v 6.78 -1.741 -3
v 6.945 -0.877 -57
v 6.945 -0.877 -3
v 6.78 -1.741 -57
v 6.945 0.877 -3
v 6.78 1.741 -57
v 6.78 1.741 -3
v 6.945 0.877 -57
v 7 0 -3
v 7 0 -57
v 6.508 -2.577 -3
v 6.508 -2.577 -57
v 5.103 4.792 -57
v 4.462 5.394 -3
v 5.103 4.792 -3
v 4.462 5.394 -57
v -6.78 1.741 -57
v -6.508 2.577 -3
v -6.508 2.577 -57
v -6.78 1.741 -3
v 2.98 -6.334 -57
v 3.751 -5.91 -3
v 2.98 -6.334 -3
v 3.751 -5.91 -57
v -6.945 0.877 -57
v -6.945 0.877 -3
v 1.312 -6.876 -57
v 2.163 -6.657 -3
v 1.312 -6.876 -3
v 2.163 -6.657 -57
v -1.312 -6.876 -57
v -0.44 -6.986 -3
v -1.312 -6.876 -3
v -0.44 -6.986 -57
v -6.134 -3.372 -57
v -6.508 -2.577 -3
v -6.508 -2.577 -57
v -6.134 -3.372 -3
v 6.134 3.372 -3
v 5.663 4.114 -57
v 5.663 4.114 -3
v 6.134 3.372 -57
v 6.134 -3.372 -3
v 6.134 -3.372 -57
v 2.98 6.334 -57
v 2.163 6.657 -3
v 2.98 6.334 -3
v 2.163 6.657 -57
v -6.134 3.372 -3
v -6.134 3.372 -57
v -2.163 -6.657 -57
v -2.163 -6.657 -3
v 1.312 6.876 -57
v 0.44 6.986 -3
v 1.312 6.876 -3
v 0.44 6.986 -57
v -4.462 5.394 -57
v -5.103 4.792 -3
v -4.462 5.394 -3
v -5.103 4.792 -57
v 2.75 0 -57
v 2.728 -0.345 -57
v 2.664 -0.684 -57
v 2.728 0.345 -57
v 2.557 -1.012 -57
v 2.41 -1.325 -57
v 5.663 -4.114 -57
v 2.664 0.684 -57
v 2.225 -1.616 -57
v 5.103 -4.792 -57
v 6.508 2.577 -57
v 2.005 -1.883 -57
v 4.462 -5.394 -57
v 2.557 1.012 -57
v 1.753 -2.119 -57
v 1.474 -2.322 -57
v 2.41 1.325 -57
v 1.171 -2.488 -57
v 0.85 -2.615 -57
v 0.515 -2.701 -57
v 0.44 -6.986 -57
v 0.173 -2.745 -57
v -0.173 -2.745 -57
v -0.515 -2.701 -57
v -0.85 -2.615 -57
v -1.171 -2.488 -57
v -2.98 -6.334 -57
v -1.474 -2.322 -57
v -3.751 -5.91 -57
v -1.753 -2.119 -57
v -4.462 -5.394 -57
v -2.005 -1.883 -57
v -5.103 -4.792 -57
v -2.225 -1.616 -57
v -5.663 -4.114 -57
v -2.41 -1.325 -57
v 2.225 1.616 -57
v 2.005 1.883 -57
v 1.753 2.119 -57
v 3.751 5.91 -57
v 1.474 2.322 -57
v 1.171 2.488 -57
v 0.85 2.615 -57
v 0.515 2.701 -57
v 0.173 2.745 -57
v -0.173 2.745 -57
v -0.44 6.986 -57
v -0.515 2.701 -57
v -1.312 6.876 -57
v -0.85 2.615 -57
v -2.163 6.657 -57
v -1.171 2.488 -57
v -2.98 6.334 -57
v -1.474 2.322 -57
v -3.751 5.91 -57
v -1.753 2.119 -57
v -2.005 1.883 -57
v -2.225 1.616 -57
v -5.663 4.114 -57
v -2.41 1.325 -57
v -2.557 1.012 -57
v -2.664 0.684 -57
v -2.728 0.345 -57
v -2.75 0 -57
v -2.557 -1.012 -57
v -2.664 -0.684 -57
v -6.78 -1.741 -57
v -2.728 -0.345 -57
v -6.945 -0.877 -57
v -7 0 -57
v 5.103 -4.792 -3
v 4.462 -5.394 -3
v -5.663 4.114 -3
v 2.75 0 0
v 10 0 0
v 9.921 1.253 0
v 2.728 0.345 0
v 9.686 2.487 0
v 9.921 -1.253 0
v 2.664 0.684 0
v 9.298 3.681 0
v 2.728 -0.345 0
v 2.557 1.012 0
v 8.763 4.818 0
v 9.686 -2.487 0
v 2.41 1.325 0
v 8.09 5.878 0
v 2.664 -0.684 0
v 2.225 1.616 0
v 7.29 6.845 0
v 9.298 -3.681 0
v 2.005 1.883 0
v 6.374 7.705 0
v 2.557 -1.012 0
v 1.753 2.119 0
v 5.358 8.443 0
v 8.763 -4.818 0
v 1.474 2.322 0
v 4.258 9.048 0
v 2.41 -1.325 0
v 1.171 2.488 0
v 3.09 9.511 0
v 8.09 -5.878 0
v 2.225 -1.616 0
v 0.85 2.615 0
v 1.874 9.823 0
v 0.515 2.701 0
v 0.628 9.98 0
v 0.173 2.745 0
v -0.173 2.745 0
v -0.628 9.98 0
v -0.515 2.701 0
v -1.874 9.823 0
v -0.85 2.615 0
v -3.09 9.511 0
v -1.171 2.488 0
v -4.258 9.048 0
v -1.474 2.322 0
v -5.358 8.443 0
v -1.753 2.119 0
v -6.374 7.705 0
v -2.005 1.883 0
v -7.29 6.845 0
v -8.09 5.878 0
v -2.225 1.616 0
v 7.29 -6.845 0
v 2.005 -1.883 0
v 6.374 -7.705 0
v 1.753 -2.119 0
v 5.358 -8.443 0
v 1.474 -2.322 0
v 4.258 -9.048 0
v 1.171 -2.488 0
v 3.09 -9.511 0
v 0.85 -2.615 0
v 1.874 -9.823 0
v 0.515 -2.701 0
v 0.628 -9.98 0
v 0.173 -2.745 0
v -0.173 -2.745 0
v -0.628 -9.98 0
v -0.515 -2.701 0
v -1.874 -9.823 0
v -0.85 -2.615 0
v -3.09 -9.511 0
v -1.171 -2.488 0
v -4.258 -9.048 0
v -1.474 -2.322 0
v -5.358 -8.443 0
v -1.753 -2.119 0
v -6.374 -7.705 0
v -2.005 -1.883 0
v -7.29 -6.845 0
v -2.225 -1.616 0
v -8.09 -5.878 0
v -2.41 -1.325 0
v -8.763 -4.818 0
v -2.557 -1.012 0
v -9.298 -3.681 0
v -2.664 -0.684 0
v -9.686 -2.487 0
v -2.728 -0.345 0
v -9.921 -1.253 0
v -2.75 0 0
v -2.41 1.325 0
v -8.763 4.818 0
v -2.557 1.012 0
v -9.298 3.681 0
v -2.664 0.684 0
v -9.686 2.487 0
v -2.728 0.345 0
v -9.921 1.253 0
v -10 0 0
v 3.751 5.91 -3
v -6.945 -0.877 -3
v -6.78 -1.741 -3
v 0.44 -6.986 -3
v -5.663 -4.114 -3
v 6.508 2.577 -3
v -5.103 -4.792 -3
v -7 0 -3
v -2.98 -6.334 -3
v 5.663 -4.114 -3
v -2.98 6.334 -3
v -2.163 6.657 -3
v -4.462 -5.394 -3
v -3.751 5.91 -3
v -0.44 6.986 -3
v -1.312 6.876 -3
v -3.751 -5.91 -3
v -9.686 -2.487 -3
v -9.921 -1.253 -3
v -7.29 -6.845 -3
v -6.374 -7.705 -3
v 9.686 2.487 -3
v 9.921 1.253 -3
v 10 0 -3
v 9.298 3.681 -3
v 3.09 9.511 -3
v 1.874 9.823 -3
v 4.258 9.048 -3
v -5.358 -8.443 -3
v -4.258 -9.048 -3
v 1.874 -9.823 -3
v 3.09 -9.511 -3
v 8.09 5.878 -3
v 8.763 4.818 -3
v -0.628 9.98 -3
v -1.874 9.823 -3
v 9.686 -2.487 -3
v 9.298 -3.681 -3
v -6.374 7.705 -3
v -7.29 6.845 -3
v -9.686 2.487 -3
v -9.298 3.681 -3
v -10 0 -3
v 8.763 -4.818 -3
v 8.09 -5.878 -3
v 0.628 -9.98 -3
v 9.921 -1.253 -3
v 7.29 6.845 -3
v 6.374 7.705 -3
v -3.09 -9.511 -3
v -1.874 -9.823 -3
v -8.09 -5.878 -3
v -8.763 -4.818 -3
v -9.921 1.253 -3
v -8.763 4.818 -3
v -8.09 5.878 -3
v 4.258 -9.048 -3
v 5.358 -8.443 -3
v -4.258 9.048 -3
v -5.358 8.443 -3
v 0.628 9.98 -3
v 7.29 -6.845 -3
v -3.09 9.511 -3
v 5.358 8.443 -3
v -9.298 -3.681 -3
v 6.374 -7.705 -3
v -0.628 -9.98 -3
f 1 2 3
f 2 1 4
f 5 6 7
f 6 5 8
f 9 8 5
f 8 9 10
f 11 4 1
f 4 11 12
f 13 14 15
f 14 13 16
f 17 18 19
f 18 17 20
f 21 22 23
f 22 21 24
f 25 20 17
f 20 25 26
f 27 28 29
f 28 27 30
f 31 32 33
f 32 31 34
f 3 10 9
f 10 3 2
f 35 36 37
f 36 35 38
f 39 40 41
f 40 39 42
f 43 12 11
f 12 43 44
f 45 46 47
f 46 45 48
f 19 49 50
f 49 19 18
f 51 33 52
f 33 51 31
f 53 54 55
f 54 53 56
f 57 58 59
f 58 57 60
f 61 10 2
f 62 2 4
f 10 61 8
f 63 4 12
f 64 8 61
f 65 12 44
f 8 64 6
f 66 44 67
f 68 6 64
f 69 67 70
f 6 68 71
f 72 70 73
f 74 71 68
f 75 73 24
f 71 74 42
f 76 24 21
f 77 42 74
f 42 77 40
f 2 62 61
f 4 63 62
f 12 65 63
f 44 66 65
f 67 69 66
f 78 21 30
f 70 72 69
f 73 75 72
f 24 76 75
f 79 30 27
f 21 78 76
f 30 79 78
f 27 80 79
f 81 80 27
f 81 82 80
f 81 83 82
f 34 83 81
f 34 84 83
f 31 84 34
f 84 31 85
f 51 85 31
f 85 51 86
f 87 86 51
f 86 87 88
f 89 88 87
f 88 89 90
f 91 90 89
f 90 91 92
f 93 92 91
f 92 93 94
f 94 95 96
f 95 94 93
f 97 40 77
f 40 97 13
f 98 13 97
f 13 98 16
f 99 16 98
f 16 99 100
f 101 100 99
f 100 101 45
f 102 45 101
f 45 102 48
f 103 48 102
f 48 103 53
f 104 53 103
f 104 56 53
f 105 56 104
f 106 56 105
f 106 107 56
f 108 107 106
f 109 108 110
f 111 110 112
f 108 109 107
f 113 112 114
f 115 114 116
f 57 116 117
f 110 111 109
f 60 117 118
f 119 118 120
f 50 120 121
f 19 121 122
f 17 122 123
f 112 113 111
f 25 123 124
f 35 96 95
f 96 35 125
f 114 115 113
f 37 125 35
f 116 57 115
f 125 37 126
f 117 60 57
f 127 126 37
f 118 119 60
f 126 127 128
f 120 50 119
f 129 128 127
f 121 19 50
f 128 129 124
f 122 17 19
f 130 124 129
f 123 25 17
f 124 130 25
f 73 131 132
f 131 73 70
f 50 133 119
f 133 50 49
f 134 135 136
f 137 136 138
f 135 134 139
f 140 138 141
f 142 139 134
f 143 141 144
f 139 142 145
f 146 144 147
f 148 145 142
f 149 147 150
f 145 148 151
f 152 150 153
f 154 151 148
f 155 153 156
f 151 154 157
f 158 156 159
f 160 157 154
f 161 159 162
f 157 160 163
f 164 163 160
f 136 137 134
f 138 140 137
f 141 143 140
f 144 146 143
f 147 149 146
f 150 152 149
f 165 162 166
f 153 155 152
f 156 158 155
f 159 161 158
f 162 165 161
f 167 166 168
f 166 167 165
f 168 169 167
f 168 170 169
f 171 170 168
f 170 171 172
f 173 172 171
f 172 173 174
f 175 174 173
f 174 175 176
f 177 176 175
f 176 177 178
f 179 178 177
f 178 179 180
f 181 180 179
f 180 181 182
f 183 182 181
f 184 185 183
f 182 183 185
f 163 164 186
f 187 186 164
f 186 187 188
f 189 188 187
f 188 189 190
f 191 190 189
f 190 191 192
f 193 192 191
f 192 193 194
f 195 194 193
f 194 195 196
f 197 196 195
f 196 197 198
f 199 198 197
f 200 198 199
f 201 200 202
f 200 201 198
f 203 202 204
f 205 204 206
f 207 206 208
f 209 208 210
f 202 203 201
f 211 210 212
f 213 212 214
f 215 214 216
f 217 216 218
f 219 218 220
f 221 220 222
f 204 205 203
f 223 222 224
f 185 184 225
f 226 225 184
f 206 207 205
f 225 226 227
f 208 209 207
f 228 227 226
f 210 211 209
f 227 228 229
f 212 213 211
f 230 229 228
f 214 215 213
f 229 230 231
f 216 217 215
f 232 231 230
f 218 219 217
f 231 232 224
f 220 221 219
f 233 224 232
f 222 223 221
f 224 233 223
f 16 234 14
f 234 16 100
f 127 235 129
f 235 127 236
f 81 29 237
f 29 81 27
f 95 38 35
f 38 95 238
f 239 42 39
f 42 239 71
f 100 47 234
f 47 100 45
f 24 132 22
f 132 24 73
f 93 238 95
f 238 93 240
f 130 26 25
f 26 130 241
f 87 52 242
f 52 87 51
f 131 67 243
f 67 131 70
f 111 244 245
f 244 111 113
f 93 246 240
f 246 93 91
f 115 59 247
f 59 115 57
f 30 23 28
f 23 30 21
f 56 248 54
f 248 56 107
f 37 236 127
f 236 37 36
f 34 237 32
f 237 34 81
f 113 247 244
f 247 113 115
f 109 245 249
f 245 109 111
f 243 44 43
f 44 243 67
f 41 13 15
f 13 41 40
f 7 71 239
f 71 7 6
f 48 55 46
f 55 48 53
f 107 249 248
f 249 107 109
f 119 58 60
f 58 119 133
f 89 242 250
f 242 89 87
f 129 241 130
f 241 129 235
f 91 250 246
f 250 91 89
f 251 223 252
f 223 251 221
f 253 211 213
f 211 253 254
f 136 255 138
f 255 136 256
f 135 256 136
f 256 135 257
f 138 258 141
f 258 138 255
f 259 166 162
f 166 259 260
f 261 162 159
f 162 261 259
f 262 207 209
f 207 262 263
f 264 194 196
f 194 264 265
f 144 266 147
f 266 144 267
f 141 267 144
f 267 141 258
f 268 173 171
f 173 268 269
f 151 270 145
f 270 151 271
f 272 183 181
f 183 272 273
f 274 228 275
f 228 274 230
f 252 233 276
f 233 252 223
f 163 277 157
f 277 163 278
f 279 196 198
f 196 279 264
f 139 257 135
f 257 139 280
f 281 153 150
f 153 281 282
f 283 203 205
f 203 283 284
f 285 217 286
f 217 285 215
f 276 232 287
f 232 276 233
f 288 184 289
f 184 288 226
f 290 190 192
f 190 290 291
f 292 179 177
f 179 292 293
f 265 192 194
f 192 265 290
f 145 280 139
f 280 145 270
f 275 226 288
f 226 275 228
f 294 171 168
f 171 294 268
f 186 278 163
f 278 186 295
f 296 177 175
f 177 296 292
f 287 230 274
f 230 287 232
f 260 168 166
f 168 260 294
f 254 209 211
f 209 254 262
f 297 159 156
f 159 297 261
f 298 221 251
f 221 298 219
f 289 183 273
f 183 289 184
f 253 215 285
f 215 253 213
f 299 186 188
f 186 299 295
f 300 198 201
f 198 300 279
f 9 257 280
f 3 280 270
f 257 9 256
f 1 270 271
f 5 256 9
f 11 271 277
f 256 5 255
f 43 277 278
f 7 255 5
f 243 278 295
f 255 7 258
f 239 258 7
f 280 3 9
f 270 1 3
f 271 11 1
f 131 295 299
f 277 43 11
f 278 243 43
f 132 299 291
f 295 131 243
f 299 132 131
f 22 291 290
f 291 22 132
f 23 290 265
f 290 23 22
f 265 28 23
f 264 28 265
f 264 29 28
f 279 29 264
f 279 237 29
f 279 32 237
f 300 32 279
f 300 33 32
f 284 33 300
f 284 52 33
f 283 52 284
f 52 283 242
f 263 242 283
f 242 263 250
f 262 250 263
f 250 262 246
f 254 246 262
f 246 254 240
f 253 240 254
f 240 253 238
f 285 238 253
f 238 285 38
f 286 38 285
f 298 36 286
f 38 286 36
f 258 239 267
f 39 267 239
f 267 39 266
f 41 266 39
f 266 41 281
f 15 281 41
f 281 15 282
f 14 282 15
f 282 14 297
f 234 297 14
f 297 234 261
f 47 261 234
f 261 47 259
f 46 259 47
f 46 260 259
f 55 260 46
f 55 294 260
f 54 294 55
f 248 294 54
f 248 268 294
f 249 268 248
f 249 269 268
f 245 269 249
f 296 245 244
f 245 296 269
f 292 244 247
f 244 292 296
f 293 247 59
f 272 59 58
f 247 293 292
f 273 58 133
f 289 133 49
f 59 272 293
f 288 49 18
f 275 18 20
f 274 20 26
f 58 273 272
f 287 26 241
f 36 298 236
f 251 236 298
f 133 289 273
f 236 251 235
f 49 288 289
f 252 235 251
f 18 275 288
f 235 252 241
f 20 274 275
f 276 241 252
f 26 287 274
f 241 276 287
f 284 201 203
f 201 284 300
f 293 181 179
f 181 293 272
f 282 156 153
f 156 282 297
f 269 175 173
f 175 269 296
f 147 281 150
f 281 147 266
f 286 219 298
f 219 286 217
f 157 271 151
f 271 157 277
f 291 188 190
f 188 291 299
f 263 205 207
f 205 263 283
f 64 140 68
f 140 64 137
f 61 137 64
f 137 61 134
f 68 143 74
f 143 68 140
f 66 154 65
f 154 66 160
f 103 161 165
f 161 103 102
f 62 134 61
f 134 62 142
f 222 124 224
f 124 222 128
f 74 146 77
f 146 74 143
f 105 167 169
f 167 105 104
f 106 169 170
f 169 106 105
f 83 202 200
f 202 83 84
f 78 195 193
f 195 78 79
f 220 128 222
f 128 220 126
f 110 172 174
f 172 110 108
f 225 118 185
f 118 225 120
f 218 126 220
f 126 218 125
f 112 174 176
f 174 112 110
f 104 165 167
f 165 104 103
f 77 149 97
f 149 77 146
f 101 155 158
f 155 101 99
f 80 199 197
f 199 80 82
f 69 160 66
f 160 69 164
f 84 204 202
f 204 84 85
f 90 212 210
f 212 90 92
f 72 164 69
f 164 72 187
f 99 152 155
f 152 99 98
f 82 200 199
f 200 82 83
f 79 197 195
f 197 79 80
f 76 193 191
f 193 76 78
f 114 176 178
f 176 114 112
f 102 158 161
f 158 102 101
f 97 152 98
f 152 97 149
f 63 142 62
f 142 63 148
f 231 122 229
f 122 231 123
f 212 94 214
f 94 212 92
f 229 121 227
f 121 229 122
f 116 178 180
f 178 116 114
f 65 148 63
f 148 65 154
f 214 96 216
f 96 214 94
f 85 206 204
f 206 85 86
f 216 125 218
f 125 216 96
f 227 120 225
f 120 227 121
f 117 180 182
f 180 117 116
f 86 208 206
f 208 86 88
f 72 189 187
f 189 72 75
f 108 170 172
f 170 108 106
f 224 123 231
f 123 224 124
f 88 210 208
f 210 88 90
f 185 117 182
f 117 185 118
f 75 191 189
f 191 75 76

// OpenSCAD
$fn = 50;


difference() {
	union() {
		translate(v = [0, 0, -57.0000000000]) {
			cylinder(h = 57, r = 7.0000000000);
		}
		translate(v = [0, 0, -3.0000000000]) {
			cylinder(h = 3, r = 10.0000000000);
		}
	}
	union() {
		#translate(v = [0, 0, -57]) {
			cylinder(h = 57, r = 2.7500000000);
		}
	}
}
